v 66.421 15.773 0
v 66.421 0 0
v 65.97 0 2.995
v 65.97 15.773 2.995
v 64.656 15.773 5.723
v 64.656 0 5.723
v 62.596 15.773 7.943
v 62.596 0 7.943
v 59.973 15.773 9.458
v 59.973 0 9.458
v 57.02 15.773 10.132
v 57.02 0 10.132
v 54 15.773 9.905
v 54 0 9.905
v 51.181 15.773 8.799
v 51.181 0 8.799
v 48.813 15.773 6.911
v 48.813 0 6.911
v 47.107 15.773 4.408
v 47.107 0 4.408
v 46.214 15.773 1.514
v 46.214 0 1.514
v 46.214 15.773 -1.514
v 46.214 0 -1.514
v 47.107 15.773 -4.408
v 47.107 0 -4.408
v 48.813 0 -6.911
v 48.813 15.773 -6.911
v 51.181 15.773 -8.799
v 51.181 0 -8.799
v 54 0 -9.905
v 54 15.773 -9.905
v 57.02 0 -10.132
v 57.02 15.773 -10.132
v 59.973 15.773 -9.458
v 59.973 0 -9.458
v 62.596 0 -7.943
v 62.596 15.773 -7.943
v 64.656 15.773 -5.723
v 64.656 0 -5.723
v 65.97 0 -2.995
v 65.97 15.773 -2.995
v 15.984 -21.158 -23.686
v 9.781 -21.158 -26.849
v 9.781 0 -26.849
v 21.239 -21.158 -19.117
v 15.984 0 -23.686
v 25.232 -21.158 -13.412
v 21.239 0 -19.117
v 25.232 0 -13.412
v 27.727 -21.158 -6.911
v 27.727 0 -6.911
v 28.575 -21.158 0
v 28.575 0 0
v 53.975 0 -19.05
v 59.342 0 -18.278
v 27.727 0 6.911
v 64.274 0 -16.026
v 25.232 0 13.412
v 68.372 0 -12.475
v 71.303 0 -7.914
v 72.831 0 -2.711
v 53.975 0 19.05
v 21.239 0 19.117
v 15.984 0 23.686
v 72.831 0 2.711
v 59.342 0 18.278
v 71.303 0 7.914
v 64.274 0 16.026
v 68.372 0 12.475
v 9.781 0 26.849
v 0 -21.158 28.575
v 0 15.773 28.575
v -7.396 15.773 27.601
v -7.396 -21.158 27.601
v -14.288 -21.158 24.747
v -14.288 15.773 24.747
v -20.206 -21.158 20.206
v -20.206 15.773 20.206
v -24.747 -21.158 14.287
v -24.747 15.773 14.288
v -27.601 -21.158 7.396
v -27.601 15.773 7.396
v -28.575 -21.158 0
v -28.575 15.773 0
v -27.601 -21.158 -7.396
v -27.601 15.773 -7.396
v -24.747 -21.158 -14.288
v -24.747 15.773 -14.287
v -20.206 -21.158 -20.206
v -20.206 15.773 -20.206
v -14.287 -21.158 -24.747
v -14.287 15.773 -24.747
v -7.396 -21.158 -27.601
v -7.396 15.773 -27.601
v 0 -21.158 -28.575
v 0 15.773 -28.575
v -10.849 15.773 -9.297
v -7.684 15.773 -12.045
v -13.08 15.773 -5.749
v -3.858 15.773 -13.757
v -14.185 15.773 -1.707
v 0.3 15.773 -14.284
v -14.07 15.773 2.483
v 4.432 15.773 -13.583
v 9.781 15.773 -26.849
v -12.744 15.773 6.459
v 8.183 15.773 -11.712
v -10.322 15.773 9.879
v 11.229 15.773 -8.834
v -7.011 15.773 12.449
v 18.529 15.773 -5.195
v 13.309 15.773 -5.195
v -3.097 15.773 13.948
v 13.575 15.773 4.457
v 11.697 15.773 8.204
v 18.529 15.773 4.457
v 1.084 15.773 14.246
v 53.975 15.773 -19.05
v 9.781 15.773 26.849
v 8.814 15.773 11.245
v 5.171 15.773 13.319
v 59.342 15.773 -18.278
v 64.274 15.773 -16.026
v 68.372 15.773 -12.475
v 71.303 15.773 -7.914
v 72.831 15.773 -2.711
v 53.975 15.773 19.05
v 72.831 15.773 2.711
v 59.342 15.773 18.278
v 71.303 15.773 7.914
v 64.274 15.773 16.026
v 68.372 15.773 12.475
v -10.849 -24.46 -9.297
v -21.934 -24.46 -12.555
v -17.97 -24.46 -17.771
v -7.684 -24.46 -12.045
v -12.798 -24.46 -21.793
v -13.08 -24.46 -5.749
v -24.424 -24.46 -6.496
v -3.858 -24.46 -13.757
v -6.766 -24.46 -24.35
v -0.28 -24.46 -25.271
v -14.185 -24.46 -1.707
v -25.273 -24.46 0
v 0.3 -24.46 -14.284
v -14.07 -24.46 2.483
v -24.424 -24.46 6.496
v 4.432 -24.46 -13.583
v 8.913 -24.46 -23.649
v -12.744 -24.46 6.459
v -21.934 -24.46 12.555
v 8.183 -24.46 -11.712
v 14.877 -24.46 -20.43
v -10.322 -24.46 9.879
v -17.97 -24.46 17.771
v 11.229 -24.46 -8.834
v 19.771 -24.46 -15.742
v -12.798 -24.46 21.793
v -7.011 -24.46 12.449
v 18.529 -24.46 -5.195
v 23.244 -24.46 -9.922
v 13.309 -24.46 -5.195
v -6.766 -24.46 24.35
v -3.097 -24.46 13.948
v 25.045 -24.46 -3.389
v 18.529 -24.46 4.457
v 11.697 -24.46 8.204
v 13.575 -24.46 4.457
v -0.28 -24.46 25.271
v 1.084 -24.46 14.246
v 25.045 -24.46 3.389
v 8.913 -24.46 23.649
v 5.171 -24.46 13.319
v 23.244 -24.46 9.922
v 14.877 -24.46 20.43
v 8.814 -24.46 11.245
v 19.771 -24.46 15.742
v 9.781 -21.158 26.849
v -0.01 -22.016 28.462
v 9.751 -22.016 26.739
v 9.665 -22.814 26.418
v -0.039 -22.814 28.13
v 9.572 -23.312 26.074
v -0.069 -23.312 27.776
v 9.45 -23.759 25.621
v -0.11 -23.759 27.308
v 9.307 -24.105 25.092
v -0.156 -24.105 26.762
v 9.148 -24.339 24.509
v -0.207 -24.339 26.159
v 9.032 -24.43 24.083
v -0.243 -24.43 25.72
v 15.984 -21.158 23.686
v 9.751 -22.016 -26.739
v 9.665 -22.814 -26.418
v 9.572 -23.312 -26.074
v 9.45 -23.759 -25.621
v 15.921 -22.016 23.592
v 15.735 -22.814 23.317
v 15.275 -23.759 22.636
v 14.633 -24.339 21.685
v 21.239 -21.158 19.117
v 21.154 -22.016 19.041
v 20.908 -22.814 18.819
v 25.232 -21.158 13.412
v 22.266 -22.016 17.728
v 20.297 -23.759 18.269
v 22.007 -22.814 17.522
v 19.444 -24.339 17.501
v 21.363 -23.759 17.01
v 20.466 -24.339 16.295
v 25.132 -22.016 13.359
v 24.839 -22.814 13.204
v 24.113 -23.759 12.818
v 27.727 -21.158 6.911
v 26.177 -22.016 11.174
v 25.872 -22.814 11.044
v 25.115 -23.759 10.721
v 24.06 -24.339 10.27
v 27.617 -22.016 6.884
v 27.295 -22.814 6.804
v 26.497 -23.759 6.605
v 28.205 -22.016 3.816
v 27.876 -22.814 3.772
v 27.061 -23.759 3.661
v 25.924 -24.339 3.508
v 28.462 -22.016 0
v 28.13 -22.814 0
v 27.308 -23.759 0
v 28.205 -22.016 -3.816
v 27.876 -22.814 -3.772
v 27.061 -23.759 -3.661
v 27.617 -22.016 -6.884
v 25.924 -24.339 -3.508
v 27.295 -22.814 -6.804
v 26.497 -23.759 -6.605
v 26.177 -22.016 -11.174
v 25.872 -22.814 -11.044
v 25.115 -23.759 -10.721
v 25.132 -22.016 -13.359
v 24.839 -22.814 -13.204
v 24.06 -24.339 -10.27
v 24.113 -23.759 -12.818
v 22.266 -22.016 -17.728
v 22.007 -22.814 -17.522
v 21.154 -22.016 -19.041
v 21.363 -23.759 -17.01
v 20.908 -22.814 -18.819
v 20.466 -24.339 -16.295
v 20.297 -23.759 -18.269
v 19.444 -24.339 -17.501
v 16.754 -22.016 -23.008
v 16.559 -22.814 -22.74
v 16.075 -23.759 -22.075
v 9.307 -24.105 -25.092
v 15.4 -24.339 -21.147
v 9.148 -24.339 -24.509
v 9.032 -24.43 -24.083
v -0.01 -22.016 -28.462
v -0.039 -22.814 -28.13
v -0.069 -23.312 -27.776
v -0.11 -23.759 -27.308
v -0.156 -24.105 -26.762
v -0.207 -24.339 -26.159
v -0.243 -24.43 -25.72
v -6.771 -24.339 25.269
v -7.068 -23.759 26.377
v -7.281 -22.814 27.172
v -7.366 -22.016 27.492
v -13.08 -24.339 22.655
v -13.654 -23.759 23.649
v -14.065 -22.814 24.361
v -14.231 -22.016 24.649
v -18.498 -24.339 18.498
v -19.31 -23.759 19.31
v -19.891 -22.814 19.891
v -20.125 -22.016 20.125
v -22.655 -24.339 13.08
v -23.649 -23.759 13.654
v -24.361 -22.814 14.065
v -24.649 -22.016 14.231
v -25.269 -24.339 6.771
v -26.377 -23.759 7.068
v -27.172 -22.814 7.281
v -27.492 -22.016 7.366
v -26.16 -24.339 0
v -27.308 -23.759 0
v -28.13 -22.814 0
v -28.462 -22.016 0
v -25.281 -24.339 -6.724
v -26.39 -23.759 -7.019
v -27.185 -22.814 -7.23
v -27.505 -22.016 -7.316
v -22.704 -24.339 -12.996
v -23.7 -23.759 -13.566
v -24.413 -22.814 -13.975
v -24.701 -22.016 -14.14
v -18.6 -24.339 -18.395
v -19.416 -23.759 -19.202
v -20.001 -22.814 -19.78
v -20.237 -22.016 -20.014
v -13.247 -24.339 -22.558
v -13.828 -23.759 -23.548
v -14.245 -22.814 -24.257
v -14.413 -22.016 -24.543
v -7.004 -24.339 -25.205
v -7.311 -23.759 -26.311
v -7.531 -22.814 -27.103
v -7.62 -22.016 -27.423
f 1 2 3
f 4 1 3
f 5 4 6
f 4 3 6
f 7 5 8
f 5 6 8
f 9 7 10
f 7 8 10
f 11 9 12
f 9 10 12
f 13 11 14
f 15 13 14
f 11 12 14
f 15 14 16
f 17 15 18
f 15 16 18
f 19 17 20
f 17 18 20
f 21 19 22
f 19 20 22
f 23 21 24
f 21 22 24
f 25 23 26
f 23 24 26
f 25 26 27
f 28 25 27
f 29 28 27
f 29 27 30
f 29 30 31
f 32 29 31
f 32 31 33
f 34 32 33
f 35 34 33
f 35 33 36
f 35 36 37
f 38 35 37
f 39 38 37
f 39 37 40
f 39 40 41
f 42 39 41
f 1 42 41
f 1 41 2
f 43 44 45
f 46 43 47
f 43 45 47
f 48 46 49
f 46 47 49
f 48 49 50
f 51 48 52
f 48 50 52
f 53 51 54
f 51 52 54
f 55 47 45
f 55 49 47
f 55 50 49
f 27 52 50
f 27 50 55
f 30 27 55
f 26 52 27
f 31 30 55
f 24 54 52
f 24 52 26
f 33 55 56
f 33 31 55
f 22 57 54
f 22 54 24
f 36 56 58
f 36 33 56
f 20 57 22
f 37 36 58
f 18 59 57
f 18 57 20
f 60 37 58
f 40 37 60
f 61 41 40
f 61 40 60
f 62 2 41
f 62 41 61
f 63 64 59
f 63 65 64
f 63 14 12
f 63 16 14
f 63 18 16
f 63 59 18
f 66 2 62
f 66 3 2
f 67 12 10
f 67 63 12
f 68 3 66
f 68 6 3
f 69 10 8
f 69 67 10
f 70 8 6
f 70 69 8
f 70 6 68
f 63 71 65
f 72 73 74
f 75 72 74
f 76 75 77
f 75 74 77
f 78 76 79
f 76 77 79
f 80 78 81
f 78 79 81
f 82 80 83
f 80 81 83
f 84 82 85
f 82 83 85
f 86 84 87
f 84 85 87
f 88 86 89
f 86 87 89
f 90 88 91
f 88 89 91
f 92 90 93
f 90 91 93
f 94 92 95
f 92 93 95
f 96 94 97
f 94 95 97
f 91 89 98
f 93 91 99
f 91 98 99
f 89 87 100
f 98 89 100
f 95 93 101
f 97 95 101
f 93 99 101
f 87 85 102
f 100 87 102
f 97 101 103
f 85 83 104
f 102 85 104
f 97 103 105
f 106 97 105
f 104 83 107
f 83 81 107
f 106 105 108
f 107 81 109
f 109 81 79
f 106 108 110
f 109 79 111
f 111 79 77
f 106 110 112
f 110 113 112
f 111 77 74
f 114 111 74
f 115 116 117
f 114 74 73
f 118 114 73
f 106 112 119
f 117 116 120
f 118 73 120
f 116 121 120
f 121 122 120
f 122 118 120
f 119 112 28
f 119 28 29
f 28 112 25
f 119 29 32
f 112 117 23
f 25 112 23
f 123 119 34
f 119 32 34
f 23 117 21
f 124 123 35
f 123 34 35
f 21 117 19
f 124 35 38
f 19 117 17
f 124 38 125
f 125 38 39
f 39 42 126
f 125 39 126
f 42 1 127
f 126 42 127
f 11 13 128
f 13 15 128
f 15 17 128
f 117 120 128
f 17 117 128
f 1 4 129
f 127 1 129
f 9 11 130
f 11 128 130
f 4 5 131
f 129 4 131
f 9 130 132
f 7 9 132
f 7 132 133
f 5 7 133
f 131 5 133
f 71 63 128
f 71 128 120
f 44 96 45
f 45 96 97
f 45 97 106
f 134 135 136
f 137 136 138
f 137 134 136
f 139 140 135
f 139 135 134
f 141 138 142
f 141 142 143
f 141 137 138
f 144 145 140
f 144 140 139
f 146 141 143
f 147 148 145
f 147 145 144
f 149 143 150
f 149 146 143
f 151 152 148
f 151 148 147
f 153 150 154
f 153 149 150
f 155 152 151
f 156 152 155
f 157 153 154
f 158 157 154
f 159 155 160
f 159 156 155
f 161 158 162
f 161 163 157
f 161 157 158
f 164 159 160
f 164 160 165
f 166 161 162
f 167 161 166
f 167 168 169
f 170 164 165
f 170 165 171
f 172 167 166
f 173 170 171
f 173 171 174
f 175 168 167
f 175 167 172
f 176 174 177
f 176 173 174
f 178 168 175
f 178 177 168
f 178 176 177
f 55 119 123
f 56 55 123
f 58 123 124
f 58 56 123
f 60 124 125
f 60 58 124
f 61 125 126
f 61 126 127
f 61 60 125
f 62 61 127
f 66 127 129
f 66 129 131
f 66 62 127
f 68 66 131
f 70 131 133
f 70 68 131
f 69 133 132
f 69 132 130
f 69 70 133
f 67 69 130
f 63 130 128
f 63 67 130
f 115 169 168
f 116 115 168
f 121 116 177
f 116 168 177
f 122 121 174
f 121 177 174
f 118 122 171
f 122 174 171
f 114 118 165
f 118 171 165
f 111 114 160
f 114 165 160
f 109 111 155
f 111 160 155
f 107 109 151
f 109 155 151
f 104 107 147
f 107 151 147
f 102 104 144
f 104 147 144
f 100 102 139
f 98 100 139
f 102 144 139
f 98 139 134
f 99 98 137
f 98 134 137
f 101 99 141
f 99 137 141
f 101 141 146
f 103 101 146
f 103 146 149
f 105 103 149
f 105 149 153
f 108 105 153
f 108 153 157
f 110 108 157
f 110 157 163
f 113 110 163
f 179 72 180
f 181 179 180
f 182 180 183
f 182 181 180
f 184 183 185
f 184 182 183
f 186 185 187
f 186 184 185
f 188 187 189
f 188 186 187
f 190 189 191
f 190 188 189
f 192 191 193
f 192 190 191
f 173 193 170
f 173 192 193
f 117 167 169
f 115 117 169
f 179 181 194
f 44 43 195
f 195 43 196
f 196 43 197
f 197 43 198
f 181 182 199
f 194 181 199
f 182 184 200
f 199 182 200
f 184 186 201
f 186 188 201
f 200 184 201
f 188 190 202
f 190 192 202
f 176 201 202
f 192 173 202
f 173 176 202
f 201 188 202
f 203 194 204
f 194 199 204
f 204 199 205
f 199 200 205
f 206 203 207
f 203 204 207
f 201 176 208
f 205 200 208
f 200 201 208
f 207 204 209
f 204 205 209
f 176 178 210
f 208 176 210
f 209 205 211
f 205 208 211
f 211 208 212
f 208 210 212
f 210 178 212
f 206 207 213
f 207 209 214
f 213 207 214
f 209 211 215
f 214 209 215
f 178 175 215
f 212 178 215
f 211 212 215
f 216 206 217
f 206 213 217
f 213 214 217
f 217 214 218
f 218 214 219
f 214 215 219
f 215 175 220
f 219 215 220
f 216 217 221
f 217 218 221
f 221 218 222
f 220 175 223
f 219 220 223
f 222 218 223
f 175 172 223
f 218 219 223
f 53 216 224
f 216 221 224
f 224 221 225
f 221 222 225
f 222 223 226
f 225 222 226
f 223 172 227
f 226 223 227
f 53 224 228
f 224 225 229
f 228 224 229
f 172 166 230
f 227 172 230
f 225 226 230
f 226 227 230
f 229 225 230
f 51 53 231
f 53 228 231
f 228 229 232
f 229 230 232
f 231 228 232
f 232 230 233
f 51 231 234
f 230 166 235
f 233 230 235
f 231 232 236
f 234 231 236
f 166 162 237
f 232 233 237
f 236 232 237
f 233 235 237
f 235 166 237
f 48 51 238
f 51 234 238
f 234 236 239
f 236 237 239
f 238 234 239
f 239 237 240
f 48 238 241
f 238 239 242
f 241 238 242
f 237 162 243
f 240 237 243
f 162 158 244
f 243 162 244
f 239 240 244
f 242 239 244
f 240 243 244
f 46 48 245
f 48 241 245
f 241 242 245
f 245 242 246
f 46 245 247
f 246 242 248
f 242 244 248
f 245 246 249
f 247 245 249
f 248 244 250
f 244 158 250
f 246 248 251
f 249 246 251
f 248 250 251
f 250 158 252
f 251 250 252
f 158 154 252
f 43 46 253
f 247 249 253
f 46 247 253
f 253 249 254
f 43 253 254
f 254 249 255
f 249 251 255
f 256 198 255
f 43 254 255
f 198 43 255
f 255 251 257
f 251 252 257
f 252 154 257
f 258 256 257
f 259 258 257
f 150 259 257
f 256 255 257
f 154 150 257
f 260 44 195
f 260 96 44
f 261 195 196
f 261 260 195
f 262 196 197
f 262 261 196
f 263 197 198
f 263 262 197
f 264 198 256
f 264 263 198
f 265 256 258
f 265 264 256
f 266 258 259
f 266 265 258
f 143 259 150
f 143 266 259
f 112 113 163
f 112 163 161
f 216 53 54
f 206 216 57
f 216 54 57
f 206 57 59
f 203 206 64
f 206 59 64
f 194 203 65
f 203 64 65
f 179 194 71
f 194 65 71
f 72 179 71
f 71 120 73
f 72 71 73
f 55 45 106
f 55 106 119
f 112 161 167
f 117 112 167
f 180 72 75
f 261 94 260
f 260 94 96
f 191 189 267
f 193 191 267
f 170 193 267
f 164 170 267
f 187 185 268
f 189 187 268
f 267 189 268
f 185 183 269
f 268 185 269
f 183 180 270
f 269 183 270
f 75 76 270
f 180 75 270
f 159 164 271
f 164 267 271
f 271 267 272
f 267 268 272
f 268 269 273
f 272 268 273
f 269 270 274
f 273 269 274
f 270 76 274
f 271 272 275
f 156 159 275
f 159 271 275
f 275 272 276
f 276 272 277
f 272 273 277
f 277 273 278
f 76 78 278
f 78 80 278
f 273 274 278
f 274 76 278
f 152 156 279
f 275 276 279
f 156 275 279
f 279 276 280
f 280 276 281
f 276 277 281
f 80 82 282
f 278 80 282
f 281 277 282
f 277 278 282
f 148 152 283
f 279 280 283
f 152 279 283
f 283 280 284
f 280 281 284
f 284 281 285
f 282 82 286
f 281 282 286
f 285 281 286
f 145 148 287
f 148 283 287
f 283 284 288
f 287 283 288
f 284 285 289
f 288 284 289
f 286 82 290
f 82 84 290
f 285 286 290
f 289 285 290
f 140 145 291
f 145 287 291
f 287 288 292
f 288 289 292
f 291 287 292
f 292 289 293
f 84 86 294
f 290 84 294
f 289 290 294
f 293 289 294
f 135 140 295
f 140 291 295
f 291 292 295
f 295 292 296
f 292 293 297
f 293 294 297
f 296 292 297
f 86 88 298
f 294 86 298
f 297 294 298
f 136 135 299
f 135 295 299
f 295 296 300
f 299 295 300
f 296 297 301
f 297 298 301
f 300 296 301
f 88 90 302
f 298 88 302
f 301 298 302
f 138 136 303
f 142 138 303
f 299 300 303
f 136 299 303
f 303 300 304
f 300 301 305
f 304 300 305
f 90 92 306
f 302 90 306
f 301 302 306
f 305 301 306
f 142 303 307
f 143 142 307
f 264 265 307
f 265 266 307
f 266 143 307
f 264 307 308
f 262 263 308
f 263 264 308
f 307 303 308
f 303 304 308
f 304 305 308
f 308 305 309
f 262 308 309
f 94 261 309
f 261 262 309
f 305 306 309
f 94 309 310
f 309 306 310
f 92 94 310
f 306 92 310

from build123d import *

# Parameters (mm, degrees)
F1_DEPTH    = 15.7734
F3_DEPTH    = 24.4602
F4_T1_DEPTH = 37.9988318329
F4_T3_DEPTH = 37.9988318329
F4_T6_ANGLE = 213.1574660215
F4_T8_ANGLE = 173.1044855741
F6_DEPTH    = 40.2346
F7_R        = 10.16
F8_DEPTH    = 15.7744


# Not quite as in the source:
# - a fillet or chamfer that OpenCascade refuses, or shapes differently, is made with other operations: its cross-section is extruded or revolved along the edge and cut away or added


with BuildPart() as f1:
    # F0 (on Front) → F1 (new body)
    with BuildSketch(Plane.XZ):
        with BuildLine():
            Line((53.975, 19.05), (9.780704698, 26.8489932886))
            Line((9.780704698, 26.8489932886), (0, 28.575))
            ThreePointArc((0, 28.575), (-28.575, 0), (0, -28.575))
            Line((0, -28.575), (9.780704698, -26.8489932886))
            Line((9.780704698, -26.8489932886), (53.975, -19.05))
            ThreePointArc((53.975, -19.05), (73.025, 0), (53.975, 19.05))
        make_face()
    extrude(amount=-F1_DEPTH)

    # F2 (on face) → F3 (join)
    with BuildSketch(Plane.XZ):
        with BuildLine():
            Line((9.780704698, 26.8489932886), (0, 28.575))
            ThreePointArc((0, 28.575), (-28.575, 0), (0, -28.575))
            Line((0, -28.575), (9.780704698, -26.8489932886))
            ThreePointArc((9.780704698, -26.8489932886), (23.4095521288, -16.3866864902), (28.575, 0))
            ThreePointArc((28.575, 0), (23.4095521288, 16.3866864902), (9.780704698, 26.8489932886))
        make_face()
    extrude(amount=F3_DEPTH)

    # F4: fillet of radius 3.302 on 4 edges, made by hand

    # F4_s2 → F4_t1 (cut)
    with BuildSketch(Plane(origin=(-18.7103124217, 0, -3.3018198391), x_dir=(0, 1, 0), z_dir=(0.9847835588, 0, 0.1737853339))):
        with BuildLine():
            ThreePointArc((-21.1582, -28.1401901932), (-23.4930665915, -27.1730567847), (-24.4602, -24.8381901932))
            Line((-24.4602, -24.8381901932), (-24.4602, -28.1401901932))
            Line((-24.4602, -28.1401901932), (-21.1582, -28.1401901932))
        make_face()
    extrude(amount=F4_T1_DEPTH, mode=Mode.SUBTRACT)

    # F4_s4 → F4_t3 (cut)
    with BuildSketch(Plane(origin=(18.7103124217, 0, -3.3018198391), x_dir=(0, 1, 0), z_dir=(-0.9847835588, 0, 0.1737853339))):
        with BuildLine():
            ThreePointArc((-21.1582, -28.1401901932), (-23.4930665915, -27.1730567847), (-24.4602, -24.8381901932))
            Line((-24.4602, -24.8381901932), (-24.4602, -28.1401901932))
            Line((-24.4602, -28.1401901932), (-21.1582, -28.1401901932))
        make_face()
    extrude(amount=F4_T3_DEPTH, mode=Mode.SUBTRACT)

    # F4_s5 → F4_t6 (revolve, cut)
    with BuildSketch(Plane(origin=(0, 0, 0), x_dir=(0, 1, 0), z_dir=(0.95842855, 0, -0.2853326385))):
        with BuildLine():
            ThreePointArc((-24.4602, 25.273), (-23.4930665915, 27.6078665915), (-21.1582, 28.575))
            Line((-21.1582, 28.575), (-24.4602, 28.575))
            Line((-24.4602, 28.575), (-24.4602, 25.273))
        make_face()
    revolve(axis=Axis((0, -24.4602, 0), (0, -1, 0)), revolution_arc=F4_T6_ANGLE, mode=Mode.SUBTRACT)

    # F4_s7 → F4_t8 (revolve, cut)
    with BuildSketch(Plane(origin=(0, 0, 0), x_dir=(0, 1, 0), z_dir=(-0.9981900481, 0, 0.0601384063))):
        with BuildLine():
            ThreePointArc((-21.1582, -28.575), (-23.4930665915, -27.6078665915), (-24.4602, -25.273))
            Line((-24.4602, -25.273), (-24.4602, -28.575))
            Line((-24.4602, -28.575), (-21.1582, -28.575))
        make_face()
    revolve(axis=Axis((0, -24.4602, 0), (0, 1, 0)), revolution_arc=F4_T8_ANGLE, mode=Mode.SUBTRACT)

    # F5 (on face) → F6 (cut, through all)
    with BuildSketch(Plane.XZ.offset(24.4602)):
        with BuildLine():
            Line((18.5293, 4.4565453057), (13.574677167, 4.4565453057))
            ThreePointArc((13.574677167, 4.4565453057), (-14.2821064756, 0.3925440984), (13.3093916754, -5.1954546943))
            Line((13.3093916754, -5.1954546943), (18.5293, -5.1954546943))
            Line((18.5293, -5.1954546943), (18.5293, 4.4565453057))
        make_face()
    extrude(amount=-F6_DEPTH, mode=Mode.SUBTRACT)

    # F7 (on face) → F8 (cut, through all)
    with BuildSketch(Plane.XZ):
        with Locations((56.261, 0)):
            Circle(F7_R)
    extrude(amount=-F8_DEPTH, mode=Mode.SUBTRACT)


solid = f1.part
